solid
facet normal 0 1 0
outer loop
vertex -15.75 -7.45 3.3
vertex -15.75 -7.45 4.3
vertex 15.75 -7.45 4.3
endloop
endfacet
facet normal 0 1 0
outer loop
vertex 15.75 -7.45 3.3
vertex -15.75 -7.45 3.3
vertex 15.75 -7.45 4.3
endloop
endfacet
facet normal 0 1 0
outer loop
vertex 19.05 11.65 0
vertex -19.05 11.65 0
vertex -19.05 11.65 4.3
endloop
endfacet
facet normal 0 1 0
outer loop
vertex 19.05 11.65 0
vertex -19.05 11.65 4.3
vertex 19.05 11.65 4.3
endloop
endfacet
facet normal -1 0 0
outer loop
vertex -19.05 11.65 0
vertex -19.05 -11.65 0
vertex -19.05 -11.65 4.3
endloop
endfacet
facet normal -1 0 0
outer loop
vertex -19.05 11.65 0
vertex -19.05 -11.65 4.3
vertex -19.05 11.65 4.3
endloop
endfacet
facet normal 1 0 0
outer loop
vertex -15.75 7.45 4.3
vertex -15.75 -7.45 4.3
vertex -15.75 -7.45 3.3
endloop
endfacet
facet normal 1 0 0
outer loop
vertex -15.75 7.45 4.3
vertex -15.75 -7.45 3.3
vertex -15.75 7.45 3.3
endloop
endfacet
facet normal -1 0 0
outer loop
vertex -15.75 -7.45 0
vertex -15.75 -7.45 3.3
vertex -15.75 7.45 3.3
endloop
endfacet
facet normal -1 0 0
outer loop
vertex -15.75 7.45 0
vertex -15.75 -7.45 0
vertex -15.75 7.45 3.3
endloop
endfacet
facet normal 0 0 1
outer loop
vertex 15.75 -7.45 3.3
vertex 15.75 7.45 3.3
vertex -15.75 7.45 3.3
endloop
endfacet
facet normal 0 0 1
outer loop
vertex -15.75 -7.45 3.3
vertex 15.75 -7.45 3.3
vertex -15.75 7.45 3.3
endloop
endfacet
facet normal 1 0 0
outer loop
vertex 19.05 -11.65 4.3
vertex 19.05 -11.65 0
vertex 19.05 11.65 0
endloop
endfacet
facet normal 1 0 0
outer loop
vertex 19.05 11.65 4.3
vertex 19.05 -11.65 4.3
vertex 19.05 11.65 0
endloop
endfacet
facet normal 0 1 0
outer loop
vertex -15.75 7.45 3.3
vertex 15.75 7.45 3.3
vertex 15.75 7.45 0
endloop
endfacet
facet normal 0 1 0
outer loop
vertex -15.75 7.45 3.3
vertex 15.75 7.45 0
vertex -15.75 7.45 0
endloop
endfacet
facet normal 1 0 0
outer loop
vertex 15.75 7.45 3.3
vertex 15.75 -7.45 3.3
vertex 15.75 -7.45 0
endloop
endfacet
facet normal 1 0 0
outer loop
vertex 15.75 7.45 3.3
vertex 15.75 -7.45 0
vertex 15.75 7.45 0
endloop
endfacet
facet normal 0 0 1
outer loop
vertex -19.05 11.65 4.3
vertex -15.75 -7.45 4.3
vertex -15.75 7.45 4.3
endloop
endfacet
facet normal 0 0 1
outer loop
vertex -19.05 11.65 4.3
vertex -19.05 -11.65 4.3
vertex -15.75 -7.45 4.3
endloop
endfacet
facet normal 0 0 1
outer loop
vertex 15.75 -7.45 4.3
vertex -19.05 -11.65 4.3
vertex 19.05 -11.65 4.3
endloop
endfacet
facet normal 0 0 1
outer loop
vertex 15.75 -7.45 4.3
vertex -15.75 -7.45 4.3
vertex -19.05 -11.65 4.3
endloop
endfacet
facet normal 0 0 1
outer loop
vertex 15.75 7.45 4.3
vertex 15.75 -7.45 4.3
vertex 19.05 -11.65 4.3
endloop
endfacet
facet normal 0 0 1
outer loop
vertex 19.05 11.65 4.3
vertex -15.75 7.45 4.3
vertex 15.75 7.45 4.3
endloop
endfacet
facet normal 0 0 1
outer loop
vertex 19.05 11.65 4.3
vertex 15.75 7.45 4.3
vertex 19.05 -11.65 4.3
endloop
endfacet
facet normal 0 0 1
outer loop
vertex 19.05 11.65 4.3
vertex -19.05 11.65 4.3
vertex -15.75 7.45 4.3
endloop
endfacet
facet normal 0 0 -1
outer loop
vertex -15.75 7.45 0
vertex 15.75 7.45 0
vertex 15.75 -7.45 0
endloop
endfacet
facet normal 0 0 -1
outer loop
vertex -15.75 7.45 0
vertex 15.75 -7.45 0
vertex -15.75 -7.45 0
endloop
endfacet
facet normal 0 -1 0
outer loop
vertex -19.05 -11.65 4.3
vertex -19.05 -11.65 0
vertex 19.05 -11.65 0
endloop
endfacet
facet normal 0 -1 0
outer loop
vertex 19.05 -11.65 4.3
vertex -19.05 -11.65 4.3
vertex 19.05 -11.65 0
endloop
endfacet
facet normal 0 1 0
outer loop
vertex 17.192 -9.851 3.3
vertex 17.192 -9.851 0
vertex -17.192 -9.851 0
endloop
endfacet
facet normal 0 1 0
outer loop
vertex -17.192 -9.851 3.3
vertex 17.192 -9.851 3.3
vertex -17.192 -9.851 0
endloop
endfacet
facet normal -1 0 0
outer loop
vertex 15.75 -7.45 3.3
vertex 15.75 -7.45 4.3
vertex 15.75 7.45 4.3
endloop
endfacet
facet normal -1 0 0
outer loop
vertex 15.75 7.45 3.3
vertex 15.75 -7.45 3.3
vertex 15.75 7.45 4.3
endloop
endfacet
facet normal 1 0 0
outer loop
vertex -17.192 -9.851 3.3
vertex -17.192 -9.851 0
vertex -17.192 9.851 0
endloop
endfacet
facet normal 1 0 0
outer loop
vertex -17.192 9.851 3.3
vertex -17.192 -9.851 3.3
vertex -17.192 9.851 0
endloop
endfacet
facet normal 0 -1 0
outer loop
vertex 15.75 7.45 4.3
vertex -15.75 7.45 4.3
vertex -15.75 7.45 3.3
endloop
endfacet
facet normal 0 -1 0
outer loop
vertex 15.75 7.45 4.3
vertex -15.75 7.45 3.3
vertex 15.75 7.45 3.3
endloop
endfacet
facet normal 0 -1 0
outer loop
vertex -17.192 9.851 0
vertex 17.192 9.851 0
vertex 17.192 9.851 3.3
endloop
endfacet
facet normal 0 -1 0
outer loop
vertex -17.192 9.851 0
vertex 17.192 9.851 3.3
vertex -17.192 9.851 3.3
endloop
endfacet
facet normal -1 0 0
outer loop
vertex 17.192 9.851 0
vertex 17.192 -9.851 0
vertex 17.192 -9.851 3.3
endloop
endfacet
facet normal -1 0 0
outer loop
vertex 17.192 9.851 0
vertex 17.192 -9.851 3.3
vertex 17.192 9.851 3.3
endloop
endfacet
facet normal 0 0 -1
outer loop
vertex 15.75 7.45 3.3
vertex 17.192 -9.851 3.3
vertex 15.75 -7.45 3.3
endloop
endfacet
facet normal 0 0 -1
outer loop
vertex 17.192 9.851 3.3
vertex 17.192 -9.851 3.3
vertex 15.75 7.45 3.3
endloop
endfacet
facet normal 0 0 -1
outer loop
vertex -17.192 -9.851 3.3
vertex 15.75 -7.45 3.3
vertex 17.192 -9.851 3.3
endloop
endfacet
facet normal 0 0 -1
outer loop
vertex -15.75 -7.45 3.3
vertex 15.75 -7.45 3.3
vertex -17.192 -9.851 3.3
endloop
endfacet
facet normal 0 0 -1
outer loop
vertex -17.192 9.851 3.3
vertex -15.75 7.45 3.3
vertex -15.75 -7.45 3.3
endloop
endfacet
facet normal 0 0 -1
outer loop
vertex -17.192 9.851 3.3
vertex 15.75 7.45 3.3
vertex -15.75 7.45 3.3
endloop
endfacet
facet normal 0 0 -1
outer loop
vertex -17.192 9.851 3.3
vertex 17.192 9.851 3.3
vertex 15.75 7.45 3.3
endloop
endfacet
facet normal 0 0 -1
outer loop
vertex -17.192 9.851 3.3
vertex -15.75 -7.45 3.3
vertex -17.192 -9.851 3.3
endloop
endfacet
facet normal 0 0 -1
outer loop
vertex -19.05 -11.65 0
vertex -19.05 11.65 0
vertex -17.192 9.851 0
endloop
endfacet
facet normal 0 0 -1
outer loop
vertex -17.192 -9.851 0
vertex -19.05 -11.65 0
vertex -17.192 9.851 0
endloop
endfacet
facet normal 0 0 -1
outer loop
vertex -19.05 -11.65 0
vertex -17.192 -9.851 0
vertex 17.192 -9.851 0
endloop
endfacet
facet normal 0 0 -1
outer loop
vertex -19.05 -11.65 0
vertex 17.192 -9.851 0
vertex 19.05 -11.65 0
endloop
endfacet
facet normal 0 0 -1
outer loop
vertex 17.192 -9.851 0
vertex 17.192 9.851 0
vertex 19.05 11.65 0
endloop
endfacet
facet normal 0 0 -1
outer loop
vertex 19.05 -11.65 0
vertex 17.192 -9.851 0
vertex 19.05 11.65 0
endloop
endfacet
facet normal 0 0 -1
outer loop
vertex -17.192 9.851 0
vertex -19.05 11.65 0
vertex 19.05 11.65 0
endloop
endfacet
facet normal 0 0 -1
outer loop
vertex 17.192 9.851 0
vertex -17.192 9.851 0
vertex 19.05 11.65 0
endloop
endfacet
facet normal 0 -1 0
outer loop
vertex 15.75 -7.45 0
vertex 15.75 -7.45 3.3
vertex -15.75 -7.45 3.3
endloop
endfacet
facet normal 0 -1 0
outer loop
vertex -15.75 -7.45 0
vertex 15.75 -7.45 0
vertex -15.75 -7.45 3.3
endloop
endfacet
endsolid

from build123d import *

# Parameters (mm, degrees)
SKICA1_W                 = 38.1
SKICA1_H                 = 23.3
P_IDAT_VYSUNUT_M1_DEPTH  = 4.3
SKICA2_W                 = 31.5
SKICA2_H                 = 14.9
ODEBRAT_VYSUNUT_M1_DEPTH = 4.3
SKICA3_W                 = 34.383278722
SKICA3_H                 = 19.702377316
ODEBRAT_VYSUNUT_M2_DEPTH = 3.3
SKICA6_W                 = 31.5
SKICA6_H                 = 14.9
P_IDAT_VYSUNUT_M3_DEPTH  = 3.3


with BuildPart() as part:
    # Skica1 → Přidat vysunutím1 (new body)
    with BuildSketch(Plane.XY):
        Rectangle(SKICA1_W, SKICA1_H)
    extrude(amount=P_IDAT_VYSUNUT_M1_DEPTH)

    # Skica2 → Odebrat vysunutím1 (cut)
    with BuildSketch(Plane.XY.offset(4.3)):
        Rectangle(SKICA2_W, SKICA2_H)
    extrude(amount=-ODEBRAT_VYSUNUT_M1_DEPTH, mode=Mode.SUBTRACT)

    # Skica3 → Odebrat vysunutím2 (cut)
    with BuildSketch(Plane(origin=(0, 0, 0), x_dir=(-1, 0, 0), z_dir=(0, 0, -1))):
        Rectangle(SKICA3_W, SKICA3_H)
    extrude(amount=-ODEBRAT_VYSUNUT_M2_DEPTH, mode=Mode.SUBTRACT)


with BuildPart() as body_2:
    # Skica6 → Přidat vysunutím3 (new body)
    with BuildSketch(Plane(origin=(0, 0, 3.3), x_dir=(-1, 0, 0), z_dir=(0, 0, -1))):
        Rectangle(SKICA6_W, SKICA6_H)
    extrude(amount=P_IDAT_VYSUNUT_M3_DEPTH)


solid = Compound([part.part, body_2.part])
